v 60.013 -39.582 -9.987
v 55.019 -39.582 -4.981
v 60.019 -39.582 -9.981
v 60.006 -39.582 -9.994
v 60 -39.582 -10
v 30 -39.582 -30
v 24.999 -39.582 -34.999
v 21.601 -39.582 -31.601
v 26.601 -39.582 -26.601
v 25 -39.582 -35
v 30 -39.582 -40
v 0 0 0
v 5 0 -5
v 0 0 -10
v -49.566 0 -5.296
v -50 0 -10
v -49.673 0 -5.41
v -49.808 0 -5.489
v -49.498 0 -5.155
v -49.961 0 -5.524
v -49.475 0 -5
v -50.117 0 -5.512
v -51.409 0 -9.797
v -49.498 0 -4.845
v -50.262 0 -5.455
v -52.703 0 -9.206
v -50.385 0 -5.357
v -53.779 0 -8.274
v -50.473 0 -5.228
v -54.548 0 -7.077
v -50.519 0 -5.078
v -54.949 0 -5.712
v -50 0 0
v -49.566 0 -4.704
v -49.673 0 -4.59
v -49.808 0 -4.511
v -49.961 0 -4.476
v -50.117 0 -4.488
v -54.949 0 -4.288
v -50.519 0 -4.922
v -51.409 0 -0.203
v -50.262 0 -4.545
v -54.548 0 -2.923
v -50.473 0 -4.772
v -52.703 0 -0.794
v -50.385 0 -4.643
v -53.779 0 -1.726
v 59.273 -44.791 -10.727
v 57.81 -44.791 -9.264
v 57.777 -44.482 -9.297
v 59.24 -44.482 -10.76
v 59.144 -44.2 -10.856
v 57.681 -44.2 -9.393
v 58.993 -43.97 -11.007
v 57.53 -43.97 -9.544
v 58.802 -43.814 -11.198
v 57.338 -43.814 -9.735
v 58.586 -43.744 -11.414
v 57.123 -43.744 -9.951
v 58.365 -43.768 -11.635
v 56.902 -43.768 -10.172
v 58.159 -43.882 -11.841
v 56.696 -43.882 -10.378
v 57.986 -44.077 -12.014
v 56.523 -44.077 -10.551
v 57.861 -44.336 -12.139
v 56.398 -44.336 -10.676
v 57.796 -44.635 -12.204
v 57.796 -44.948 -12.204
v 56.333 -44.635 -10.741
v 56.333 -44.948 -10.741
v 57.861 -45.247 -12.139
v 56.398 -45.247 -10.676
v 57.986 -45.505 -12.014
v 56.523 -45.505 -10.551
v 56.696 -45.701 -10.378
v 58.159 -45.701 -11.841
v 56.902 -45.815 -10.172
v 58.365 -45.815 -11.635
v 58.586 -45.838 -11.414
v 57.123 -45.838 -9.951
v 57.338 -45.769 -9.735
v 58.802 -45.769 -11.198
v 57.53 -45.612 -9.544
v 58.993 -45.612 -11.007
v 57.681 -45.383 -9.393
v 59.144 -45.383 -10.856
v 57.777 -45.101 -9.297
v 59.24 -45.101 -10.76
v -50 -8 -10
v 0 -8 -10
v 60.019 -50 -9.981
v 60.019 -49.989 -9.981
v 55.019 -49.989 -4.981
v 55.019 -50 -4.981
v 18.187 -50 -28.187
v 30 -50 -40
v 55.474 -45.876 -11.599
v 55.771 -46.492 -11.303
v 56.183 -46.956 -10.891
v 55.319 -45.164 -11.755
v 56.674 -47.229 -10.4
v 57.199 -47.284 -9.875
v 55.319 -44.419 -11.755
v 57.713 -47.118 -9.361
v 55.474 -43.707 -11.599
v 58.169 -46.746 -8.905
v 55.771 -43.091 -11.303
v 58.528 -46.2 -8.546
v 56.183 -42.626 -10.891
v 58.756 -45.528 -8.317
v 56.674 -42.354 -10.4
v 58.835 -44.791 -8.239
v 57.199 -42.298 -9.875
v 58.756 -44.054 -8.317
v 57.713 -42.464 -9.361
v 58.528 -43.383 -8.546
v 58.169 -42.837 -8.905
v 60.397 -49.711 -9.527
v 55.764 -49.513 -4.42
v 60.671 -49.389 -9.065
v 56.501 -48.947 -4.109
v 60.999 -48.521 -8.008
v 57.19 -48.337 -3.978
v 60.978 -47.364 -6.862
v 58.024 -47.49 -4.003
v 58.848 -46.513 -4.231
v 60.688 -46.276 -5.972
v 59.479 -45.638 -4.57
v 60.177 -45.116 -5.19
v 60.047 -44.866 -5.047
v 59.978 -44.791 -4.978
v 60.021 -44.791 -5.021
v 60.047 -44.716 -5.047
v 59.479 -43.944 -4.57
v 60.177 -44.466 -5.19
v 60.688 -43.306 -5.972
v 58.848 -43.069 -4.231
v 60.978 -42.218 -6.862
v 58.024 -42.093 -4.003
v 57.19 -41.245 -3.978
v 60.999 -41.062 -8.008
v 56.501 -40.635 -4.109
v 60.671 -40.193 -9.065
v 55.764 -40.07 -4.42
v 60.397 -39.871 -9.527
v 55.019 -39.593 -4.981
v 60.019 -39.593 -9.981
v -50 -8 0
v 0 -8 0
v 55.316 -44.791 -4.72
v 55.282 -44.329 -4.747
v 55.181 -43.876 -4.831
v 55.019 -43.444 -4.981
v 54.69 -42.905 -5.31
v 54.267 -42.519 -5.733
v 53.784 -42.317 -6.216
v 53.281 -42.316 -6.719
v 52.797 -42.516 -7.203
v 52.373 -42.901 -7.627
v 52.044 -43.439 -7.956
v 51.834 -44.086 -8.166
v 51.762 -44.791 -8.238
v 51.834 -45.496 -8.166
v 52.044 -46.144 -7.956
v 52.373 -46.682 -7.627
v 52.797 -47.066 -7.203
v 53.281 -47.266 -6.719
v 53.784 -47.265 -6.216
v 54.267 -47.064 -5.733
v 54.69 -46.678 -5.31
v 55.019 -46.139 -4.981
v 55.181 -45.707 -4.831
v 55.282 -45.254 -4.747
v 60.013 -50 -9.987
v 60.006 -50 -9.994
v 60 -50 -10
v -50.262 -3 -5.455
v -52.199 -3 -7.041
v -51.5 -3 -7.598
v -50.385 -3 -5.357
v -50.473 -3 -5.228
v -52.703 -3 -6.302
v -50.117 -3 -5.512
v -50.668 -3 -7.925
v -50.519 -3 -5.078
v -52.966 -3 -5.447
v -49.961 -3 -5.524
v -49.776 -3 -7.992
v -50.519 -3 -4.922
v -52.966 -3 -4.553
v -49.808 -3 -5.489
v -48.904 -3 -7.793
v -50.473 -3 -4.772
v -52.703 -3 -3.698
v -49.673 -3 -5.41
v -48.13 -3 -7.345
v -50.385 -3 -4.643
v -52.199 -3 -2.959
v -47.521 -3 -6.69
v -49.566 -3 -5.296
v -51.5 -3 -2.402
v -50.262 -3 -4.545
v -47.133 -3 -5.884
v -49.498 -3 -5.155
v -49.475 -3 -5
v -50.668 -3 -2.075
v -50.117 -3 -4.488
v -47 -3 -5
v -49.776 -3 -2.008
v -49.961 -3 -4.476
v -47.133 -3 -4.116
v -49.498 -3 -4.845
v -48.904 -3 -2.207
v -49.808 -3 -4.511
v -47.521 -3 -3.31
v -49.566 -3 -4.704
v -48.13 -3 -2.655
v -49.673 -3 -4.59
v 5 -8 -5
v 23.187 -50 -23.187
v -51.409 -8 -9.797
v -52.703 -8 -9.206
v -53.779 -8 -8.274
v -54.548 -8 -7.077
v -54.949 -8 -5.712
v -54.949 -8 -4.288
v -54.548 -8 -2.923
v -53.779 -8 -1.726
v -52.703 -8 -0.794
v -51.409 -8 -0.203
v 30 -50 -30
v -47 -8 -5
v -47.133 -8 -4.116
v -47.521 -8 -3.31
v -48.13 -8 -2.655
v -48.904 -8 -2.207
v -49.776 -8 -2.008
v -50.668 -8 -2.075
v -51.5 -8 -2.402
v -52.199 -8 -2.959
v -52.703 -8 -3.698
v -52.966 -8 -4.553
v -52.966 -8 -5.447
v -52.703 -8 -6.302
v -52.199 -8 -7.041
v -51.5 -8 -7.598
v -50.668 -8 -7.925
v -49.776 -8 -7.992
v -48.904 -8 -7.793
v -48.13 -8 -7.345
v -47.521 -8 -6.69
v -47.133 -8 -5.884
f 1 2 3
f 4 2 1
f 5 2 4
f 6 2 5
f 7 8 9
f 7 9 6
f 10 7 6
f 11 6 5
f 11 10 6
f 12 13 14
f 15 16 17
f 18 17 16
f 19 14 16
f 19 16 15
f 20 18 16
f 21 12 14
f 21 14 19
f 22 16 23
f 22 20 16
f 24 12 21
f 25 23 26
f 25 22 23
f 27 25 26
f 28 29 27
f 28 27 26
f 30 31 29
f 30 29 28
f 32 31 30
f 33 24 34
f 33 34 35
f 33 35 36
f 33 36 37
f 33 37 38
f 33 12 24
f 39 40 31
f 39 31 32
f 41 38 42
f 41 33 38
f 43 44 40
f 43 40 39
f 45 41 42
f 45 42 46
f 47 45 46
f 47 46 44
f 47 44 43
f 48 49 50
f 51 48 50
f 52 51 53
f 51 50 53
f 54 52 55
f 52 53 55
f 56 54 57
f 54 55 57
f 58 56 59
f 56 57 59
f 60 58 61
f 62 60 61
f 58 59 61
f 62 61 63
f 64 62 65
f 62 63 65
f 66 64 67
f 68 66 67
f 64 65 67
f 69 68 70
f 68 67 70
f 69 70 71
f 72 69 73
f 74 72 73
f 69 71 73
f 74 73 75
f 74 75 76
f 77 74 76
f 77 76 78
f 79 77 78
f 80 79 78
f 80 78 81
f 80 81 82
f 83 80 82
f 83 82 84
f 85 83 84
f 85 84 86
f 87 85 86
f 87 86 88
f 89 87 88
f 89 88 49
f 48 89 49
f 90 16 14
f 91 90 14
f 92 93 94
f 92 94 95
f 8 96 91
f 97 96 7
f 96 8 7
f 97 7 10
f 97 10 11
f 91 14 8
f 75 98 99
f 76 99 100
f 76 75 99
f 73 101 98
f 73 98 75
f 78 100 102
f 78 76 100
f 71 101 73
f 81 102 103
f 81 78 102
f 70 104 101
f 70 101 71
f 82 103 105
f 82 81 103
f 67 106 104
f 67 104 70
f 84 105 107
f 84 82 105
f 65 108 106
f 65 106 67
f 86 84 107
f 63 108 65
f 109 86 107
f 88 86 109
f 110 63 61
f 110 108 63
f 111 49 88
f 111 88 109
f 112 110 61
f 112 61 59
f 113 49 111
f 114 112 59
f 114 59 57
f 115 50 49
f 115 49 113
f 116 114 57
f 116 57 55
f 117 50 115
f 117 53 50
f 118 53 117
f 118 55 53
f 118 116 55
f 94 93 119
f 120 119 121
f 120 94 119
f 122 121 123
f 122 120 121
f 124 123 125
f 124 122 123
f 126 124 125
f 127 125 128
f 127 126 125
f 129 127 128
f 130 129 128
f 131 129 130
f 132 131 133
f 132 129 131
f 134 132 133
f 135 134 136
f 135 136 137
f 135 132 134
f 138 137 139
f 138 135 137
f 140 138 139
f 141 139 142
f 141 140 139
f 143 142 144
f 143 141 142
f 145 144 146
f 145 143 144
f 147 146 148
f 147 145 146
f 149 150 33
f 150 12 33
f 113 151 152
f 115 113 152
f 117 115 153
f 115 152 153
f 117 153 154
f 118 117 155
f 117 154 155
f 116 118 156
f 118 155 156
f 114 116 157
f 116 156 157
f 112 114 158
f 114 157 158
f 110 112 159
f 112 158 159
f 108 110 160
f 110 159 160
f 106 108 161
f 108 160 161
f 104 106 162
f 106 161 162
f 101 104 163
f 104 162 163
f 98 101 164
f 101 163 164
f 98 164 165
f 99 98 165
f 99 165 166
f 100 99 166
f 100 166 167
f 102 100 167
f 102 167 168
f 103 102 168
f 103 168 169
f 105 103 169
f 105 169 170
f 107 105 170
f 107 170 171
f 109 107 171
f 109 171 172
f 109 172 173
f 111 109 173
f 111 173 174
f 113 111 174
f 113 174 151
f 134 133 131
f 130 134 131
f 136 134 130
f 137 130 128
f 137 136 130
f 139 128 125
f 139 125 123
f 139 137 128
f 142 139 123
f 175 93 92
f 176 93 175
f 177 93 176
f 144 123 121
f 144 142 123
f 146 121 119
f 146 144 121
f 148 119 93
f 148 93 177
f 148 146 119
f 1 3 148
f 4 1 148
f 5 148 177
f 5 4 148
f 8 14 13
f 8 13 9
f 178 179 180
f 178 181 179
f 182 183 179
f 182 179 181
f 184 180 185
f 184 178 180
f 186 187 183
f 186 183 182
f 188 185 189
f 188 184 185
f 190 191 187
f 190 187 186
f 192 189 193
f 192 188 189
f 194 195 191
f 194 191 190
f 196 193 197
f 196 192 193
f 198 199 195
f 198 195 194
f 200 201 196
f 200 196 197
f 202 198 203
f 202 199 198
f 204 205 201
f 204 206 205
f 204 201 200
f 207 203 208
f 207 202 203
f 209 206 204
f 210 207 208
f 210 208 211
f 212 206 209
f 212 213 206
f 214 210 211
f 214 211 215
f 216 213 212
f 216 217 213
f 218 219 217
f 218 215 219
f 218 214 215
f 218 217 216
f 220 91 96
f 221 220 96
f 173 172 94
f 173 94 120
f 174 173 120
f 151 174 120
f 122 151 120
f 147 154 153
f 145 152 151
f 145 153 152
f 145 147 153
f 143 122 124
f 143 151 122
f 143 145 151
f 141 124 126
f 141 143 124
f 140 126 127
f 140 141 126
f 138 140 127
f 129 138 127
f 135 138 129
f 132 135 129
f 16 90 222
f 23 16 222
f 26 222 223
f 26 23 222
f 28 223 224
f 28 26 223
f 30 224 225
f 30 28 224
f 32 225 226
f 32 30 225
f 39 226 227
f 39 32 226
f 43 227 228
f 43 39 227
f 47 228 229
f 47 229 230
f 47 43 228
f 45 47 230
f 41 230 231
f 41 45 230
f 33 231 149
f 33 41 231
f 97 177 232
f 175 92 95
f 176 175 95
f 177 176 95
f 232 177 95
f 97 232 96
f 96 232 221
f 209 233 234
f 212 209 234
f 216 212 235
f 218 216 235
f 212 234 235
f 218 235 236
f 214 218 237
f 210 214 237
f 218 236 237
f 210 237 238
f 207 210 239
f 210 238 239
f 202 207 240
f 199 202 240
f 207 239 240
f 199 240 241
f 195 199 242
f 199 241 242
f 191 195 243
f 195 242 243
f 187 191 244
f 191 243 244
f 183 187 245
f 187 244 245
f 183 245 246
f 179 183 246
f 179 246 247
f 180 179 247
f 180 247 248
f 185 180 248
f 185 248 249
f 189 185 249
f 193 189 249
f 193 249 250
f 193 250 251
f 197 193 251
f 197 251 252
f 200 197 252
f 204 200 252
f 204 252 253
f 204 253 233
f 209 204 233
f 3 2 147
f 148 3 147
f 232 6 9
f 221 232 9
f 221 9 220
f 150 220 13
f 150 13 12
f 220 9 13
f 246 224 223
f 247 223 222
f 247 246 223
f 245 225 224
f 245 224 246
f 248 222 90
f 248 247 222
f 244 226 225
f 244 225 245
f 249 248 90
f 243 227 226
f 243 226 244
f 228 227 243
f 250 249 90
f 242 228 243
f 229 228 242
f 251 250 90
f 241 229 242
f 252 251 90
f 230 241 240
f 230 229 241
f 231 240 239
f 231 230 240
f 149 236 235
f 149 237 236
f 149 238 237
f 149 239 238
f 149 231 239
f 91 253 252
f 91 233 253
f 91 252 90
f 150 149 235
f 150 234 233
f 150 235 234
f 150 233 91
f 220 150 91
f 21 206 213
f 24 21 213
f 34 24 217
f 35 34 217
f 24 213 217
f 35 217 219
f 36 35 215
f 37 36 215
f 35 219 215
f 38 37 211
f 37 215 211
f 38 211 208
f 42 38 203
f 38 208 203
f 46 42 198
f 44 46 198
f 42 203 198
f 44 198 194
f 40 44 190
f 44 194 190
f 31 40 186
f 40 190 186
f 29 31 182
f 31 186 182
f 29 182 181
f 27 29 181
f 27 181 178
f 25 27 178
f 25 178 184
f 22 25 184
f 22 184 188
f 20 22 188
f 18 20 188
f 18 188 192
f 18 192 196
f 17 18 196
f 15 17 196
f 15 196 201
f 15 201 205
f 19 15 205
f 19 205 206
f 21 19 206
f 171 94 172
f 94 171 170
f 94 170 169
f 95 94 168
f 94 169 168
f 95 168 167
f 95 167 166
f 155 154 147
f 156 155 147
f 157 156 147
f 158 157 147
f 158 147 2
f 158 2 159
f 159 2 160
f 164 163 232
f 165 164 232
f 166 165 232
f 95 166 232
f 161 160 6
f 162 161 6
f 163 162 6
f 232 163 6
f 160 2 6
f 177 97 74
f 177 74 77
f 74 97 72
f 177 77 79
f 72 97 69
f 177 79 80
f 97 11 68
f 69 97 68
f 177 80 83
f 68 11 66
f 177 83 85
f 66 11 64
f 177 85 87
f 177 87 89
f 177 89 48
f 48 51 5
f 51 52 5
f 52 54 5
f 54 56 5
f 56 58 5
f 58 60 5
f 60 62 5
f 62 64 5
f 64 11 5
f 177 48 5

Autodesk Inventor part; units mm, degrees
ref_plane "YZ Plane" through (0, 0, 0) normal (1, 0, 0) x (0, 1, 0)
ref_plane "XZ Plane" through (0, 0, 0) normal (0, 1, 0) x (-1, 0, 0)
ref_plane "XY Plane" through (0, 0, 0) normal (0, 0, 1) x (1, 0, 0)
sketch "Sketch1" plane through (0, 0, 0) normal (0, 1, 0) x (-1, 0, 0)
  line L0 (0, 0) -> (50, 0)
  arc A0 (50, -10) -> (50, 0) centre (50, -5) ccw
  line L1 (50, -10) -> (0, -10)
  line L2 (0, -10) -> (-30, -40)
  line L3 (-30, -40) -> (-60, -10)
  arc A1 (-55.0192, -4.9808) -> (-60, -10) centre (-57.5, -7.5) ccw
  line L4 (-55.0192, -4.9808) -> (-30, -30)
  line L5 (-30, -30) -> (0, 0)
  dimension "d0" = 10
  dimension "d1" = 5
  dimension "d2" = 50
  dimension "d4" = 135
  dimension "d5" = 50
  dimension "d6" = 135
  dimension "d7" = 30
  dimension "d9" = 90
  dimension "d10" = 3.5356
  dimension "d40" = 30
extrude "Extrusion1" add sketch "Sketch1" against normal blind 50
sketch "Sketch2" plane through (-50, 0, 0) normal (0, 0, 1) x (1, 0, 0)
  line L0 (-5, 0) -> (-5, -50) projected
  line L1 (80, -50) -> (50, -50) projected
  line L2 (-5, -8) -> (50, -8)
  line L3 (50, -8) -> (50, -50)
  line L4 (50, -50) -> (-5, -50)
  line L5 (-5, -50) -> (-5, -8)
  line L6 (0, 0) -> (50, 0) projected
  dimension "d13" = 8
extrude "Extrusion2" cut sketch "Sketch2" against normal blind 50
sketch "Sketch3" plane through (-50, -8, 0) normal (0, -1, 0) x (1, 0, 0)
  line L0 (0, 0) -> (50, 0) projected
  arc A0 (0, 0) -> (0, -10) centre (0, -5) ccw projected
  circle A1 centre (0, -5) radius 3
  dimension "d19" = 3
extrude "Extrusion3" cut sketch "Sketch3" against normal blind 5
sketch "Sketch4" plane through (-50, -3, -5) normal (0, -1, 0) x (1, 0, 0)
  circle A0 centre (0, 0) radius 0.525
  point P0 (50, 5)
  dimension "d22" = 1.05
extrude "Extrusion4" cut sketch "Sketch4" against normal blind 5
sketch "Sketch5" plane through (30, -50, -40) normal (-0.7071068, 0, -0.7071068) x (-0.7071068, 0, 0.7071068)
  line L0 (42.4264, 42) -> (77.7817, 42) projected
  line L1 (42.4264, 42) -> (16.7059, 0)
  line L2 (42.4264, 0) -> (0, 0) projected
  line L3 (16.7059, 0) -> (42.4264, 0)
  line L4 (42.4264, 0) -> (42.4264, 42)
  line L5 (42.4264, 42) -> (42.4264, 0) projected
  line L6 (7.0711, 50) -> (7.0711, 0) projected
  line L7 (0, 50) -> (42.4264, 50) projected
  line L8 (7.0711, 50) -> (42.4264, 50)
  line L9 (42.4264, 50) -> (11.8774, 10.4177)
  line L10 (11.8774, 10.4177) -> (7.0711, 10.4177)
  line L11 (7.0711, 10.4177) -> (7.0711, 50)
  point P0 (49.4975, 50)
  point P1 (7.0711, 10.4177)
  dimension "d41" = 50
extrude "Extrusion5" cut sketch "Sketch5" against normal through all
sketch "Sketch7" plane through (0, -50, 0) normal (0.7071068, 0, 0.7071068) x (0.7071068, 0, -0.7071068)
  line L0 (0, 42) -> (7.0711, 42) projected
  line L1 (7.0711, 0) -> (7.0711, 42) projected
  line L2 (0, 42) -> (7.0711, 42)
  line L3 (7.0711, 42) -> (7.0711, 0)
  line L4 (7.0711, 0) -> (0, 0)
  line L5 (0, 0) -> (0, 42)
  point P0 (0, 50)
extrude "Extrusion6" cut sketch "Sketch7" against normal through all
sketch "Sketch8" plane through (55.0192, -50, -4.9808) normal (-0.7071068, 0, 0.7071068) x (0.7071068, 0, 0.7071068)
  line L0 (-42.4536, 10.4177) -> (-42.4536, 50) projected
  line L1 (-42.4536, 10.4177) -> (3.5084, 10.4177)
  line L2 (3.5084, 10.4177) -> (3.5084, 50.93)
  line L3 (3.5084, 50.93) -> (-42.4536, 50.93)
  line L4 (-42.4536, 50.93) -> (-42.4536, 10.4177)
  point P0 (-35.3825, 50)
  point P1 (-42.4536, 50)
  point P2 (-42.4536, 14.8933)
  point P3 (-42.4536, 14.8933)
extrude "Extrusion7" cut sketch "Sketch8" against normal blind 10
sketch "Sketch9" plane through (30, -50, -30) normal (-0.7071068, 0, 0.7071068) x (0.7071068, 0, 0.7071068)
  line L0 (-7.0711, 0) -> (35.3553, 0) projected
  line L1 (35.3553, 10.4177) -> (35.3553, 0) projected
  arc A0 (35.3553, 0) -> (35.3553, 10.4177) centre (33.2861, 5.2088) ccw
  line L2 (38.8909, 10.4177) -> (38.8909, 0) projected
  line L3 (35.3825, 10.4177) -> (35.3825, 0) projected
  line L4 (35.3825, 10.4177) -> (38.8909, 10.4177)
  line L5 (35.3553, 0) -> (38.8909, 0) projected
  line L6 (38.8909, 0) -> (38.8909, 10.4177)
  line L7 (38.8909, 0) -> (35.3553, 0)
  point P0 (0, 50)
  point P1 (35.3825, 10.4068)
  point P2 (38.8909, 5.2088)
  point P3 (35.3825, 0.0109)
extrude "Extrusion8" cut sketch "Sketch9" against normal blind 10 contours L3 L4 L2 A0 | A0 L2 L5 L3
sketch "Sketch10" plane through (30, -50, -30) normal (-0.7071068, 0, 0.7071068) x (0.7071068, 0, 0.7071068)
  line L0 (35.3825, 10.4177) -> (0, 10.4177) projected
  circle A0 centre (33.2768, 5.2087) radius 2.5
  point P0 (0, 50)
  dimension "d33" = 5.209
  dimension "d34" = 2.5
extrude "Extrusion9" cut sketch "Sketch10" against normal blind 5
sketch "Sketch11" plane through (57.0658, -44.7913, -10.0053) normal (-0.7071068, 0, 0.7071068) x (0.7071068, 0, 0.7071068)
  circle A0 centre (0, 0) radius 1.05
  point P0 (-33.2768, 44.7913)
  dimension "d37" = 1.05
extrude "Extrusion10" cut sketch "Sketch11" against normal blind 11
properties part number "connector"
